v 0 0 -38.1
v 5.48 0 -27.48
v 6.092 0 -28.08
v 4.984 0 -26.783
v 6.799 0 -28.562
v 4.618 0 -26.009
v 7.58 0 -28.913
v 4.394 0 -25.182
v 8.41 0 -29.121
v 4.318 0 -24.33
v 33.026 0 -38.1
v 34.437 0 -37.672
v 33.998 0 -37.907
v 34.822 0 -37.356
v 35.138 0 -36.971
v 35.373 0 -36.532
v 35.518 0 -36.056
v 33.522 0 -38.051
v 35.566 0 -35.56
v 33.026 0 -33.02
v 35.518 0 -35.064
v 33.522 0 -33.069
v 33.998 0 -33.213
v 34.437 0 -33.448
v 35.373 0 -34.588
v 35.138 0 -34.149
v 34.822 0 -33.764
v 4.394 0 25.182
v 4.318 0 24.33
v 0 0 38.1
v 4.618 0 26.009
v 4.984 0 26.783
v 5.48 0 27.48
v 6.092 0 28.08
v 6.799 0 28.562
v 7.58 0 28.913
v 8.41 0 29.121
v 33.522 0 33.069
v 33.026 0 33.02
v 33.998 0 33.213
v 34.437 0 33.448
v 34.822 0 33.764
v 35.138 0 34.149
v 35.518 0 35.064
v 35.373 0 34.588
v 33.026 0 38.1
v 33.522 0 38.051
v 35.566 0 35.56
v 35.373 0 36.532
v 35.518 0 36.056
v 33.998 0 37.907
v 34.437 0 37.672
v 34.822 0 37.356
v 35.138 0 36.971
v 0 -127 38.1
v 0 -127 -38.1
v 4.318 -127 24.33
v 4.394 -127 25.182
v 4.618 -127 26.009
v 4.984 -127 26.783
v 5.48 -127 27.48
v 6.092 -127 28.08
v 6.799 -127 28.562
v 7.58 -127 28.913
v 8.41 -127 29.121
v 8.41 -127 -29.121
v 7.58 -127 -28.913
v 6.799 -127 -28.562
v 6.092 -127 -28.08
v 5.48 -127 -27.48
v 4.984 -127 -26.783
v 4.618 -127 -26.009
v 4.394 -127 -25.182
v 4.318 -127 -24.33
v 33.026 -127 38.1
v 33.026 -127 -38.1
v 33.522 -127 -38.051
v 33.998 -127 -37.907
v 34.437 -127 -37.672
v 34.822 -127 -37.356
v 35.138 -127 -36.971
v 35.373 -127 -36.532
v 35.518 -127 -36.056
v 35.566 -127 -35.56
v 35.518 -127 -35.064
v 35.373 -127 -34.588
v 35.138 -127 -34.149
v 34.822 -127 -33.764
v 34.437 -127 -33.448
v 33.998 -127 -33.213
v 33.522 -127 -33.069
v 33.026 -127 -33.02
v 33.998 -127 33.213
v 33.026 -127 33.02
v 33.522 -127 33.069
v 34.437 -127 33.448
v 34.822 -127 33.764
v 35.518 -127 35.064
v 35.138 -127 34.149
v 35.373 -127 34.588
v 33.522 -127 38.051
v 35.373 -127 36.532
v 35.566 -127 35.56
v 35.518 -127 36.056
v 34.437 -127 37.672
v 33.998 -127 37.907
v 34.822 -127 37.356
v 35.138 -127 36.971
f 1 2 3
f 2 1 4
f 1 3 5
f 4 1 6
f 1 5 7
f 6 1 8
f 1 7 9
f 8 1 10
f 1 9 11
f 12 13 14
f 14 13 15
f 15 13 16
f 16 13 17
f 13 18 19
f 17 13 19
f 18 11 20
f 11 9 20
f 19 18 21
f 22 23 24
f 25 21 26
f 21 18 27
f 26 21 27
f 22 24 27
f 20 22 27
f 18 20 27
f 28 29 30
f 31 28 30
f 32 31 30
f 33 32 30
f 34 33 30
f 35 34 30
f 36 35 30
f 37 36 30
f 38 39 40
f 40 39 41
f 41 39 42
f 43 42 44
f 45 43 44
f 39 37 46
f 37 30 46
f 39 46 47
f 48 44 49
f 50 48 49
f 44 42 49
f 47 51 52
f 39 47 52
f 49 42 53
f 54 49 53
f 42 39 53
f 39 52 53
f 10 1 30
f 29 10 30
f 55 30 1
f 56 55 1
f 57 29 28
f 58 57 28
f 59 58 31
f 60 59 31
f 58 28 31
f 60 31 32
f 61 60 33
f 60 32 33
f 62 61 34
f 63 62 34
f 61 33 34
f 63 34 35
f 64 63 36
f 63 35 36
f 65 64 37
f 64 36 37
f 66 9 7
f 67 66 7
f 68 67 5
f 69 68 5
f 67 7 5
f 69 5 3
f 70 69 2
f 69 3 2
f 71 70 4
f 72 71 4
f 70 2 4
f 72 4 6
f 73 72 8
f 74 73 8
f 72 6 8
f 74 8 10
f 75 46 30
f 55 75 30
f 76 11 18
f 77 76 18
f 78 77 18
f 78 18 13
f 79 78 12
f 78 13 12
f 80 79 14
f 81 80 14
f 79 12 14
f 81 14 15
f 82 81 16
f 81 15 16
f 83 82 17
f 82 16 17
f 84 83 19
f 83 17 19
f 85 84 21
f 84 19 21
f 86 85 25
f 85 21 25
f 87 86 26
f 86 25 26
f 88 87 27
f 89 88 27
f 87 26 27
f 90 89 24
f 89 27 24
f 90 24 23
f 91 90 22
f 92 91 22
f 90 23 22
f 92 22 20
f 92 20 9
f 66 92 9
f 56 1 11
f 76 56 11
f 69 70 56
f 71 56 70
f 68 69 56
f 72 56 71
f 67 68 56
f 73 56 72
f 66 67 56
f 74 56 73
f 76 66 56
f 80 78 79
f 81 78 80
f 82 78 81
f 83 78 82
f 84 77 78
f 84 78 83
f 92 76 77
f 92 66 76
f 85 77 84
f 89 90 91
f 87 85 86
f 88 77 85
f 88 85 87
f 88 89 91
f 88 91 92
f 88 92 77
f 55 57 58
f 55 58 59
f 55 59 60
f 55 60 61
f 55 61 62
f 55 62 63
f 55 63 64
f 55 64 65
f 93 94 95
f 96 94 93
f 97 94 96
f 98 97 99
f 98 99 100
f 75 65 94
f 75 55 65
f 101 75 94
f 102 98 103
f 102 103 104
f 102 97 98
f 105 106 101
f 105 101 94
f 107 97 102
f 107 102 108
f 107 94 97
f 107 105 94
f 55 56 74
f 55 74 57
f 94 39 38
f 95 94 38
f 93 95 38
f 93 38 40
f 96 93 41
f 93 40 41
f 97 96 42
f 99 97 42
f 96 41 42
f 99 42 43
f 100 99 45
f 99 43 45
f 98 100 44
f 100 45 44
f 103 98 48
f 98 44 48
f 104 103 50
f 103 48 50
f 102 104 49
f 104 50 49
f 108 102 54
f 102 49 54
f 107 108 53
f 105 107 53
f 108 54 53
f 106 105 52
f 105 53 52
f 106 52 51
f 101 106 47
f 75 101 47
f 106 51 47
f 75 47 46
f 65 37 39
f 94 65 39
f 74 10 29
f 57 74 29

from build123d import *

# Parameters (mm, degrees)
F1_DEPTH = 127


with BuildPart() as f1:
    # F0 (on Front) → F1 (new body)
    with BuildSketch(Plane.XZ):
        with BuildLine():
            Line((4.318, 0), (4.318, 24.329558))
            ThreePointArc((4.318, 24.329558), (5.480366, 27.48029), (8.410474, 29.121229))
            Line((8.410474, 29.121229), (33.026342, 33.02))
            ThreePointArc((33.026342, 33.02), (35.566342, 35.56), (33.026342, 38.1))
            Line((33.026342, 38.1), (0, 38.1))
            Line((0, 38.1), (0, 0))
            Line((0, 0), (0, -38.1))
            Line((0, -38.1), (33.026342, -38.1))
            ThreePointArc((33.026342, -38.1), (35.566342, -35.56), (33.026342, -33.02))
            Line((33.026342, -33.02), (8.410474, -29.121229))
            ThreePointArc((8.410474, -29.121229), (5.480366, -27.48029), (4.318, -24.329558))
            Line((4.318, -24.329558), (4.318, 0))
        make_face()
    extrude(amount=F1_DEPTH)


solid = f1.part
